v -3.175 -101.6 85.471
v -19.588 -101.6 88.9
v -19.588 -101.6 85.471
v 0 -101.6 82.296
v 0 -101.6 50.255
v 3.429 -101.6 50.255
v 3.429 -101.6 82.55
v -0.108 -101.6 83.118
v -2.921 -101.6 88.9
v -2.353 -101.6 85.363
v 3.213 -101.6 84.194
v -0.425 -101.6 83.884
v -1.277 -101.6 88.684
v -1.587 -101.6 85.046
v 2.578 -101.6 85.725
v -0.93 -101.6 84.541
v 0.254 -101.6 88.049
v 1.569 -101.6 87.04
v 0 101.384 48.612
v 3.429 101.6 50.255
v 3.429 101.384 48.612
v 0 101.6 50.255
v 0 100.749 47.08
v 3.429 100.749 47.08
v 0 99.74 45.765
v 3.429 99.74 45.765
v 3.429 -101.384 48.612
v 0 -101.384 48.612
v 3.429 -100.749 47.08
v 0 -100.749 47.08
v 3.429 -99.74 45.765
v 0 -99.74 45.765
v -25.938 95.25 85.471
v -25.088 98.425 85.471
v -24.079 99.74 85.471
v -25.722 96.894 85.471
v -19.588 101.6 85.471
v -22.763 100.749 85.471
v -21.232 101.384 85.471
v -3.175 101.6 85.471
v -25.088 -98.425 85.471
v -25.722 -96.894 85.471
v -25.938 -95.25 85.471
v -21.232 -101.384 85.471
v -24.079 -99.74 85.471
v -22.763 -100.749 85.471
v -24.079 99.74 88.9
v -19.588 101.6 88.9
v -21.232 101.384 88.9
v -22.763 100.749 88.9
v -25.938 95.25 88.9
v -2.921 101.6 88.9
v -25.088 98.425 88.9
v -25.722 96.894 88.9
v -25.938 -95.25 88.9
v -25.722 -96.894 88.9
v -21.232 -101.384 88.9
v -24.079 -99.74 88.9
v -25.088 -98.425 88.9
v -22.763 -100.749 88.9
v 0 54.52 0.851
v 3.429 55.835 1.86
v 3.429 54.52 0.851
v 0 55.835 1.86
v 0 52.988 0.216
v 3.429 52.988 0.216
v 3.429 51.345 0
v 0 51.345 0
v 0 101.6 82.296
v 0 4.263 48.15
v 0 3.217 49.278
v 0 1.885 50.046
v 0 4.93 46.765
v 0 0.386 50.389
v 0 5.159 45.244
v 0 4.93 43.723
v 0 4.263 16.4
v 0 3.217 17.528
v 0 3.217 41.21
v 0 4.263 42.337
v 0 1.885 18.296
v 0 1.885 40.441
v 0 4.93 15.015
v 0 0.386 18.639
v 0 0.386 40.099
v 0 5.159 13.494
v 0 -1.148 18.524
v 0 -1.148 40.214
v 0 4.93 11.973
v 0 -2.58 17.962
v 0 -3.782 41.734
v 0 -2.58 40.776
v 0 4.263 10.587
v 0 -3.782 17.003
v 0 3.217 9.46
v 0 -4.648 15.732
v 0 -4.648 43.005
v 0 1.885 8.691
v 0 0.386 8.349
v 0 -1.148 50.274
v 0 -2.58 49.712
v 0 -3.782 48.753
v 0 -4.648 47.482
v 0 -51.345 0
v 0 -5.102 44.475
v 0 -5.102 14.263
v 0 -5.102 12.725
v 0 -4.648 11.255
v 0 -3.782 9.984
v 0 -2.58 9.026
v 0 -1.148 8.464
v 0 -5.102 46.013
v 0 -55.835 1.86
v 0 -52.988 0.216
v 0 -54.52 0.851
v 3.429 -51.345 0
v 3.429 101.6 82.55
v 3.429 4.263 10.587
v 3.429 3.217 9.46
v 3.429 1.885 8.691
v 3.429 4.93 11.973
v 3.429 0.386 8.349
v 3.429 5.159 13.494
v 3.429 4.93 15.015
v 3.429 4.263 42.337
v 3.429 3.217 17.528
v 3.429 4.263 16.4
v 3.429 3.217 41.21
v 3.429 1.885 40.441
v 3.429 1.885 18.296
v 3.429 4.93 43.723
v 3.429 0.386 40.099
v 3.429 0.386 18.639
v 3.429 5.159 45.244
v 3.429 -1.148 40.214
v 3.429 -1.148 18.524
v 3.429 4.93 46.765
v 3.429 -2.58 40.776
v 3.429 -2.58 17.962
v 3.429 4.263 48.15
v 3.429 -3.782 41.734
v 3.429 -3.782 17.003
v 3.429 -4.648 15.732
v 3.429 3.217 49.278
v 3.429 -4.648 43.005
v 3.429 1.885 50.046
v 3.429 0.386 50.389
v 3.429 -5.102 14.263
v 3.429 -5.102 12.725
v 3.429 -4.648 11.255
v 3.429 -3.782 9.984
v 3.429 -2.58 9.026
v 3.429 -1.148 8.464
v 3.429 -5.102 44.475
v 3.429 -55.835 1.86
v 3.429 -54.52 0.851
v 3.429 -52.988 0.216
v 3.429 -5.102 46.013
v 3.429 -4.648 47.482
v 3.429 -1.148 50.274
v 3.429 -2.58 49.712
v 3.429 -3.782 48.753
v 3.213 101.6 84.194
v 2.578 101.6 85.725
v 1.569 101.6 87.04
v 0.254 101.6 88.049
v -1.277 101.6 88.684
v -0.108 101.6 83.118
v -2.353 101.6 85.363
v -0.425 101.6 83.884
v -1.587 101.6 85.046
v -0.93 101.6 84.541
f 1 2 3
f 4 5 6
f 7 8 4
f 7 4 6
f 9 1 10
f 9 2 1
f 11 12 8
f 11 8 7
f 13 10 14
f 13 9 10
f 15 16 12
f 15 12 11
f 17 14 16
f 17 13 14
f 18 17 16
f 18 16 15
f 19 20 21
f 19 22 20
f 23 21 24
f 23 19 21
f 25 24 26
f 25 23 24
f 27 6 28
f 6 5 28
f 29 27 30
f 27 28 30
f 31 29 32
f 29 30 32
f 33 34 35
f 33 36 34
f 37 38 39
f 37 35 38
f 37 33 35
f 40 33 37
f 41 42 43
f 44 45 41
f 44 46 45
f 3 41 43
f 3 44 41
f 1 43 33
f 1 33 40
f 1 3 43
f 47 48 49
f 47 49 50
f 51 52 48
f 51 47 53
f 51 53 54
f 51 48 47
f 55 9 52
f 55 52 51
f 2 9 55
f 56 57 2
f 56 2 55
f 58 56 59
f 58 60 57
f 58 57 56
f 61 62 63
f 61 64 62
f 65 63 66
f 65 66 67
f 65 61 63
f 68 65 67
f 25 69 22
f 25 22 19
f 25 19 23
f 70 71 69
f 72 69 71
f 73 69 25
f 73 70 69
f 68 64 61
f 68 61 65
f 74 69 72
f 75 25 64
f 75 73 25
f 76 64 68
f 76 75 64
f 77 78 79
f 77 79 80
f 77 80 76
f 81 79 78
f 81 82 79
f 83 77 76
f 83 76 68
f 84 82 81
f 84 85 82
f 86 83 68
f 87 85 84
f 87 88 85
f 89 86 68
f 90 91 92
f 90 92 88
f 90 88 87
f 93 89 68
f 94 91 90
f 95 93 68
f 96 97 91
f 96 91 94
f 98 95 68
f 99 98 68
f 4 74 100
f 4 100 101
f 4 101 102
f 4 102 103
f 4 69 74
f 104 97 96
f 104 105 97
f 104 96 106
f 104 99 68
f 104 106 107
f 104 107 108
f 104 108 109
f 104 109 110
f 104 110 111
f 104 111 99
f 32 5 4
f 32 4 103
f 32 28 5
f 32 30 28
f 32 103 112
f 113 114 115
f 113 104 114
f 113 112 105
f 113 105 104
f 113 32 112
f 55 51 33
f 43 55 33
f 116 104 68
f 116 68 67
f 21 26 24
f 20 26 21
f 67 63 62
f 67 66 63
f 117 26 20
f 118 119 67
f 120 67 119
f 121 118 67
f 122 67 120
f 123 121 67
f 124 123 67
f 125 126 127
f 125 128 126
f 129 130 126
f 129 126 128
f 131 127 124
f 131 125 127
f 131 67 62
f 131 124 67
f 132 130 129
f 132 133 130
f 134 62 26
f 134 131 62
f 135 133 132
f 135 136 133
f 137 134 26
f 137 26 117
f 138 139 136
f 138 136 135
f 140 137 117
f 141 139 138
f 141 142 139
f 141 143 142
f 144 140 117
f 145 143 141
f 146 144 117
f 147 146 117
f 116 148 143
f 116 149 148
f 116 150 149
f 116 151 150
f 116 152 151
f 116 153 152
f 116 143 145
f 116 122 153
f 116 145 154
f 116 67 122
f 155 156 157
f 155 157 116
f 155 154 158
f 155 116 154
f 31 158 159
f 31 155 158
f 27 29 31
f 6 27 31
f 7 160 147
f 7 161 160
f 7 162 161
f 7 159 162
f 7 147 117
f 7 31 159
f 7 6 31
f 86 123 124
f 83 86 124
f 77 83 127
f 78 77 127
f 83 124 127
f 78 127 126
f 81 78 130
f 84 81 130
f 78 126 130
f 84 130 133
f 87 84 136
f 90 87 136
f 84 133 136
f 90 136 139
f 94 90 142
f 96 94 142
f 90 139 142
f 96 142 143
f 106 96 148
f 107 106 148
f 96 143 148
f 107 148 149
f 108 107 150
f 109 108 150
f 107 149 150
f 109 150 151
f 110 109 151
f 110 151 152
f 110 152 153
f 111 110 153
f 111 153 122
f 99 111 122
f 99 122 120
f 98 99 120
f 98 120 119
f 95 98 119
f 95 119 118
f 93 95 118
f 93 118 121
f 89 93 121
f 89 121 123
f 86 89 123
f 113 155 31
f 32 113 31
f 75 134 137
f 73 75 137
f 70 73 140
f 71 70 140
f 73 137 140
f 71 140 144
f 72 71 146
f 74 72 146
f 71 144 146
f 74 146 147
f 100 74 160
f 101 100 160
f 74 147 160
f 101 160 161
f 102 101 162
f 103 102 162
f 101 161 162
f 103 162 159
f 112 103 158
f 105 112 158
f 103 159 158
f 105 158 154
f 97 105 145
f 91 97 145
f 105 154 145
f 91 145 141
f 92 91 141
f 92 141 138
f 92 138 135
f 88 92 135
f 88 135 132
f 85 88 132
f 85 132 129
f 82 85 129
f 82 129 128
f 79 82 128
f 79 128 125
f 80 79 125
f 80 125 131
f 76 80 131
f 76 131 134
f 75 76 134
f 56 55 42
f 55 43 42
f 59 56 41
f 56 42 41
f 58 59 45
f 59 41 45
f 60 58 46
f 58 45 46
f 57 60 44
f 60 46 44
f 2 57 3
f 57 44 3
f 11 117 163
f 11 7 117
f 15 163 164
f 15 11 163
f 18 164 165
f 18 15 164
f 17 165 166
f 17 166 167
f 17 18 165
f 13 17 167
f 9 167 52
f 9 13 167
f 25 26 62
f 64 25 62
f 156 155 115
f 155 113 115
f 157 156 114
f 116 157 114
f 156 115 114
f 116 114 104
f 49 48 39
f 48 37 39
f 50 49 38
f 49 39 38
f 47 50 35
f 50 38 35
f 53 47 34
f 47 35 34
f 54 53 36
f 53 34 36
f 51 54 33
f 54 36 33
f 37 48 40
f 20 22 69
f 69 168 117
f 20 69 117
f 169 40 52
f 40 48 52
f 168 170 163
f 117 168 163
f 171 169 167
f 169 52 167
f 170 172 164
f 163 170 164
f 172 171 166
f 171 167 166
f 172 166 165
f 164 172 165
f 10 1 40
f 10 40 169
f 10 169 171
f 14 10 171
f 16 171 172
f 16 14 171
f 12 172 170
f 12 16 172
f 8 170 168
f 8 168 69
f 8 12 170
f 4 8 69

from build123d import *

# Parameters (mm, degrees)
F1_DEPTH      = 101.6
F3_DEPTH      = 25.4
F3_DEPTH_BACK = 25.4
F4_R          = 6.35
F5_R          = 5.159375
F6_DEPTH      = 25.4
F6_DEPTH_BACK = 25.4


with BuildPart() as f1:
    # F0 (on Front) → F1 (new body, symmetric)
    with BuildSketch(Plane.XZ):
        with BuildLine():
            Line((-2.921, 88.9), (-25.93848, 88.9))
            Line((-25.93848, 88.9), (-25.93848, 85.471))
            Line((-25.93848, 85.471), (-3.175, 85.471))
            ThreePointArc((-3.175, 85.471), (-0.9299359697, 84.5410640303), (0, 82.296))
            Line((0, 82.296), (0, 0))
            Line((0, 0), (3.429, 0))
            Line((3.429, 0), (3.429, 82.55))
            ThreePointArc((3.429, 82.55), (1.5691280605, 87.0401280605), (-2.921, 88.9))
        make_face()
    extrude(amount=F1_DEPTH, both=True)

    # F2 (on face) → F3 (cut, two sides)
    with BuildSketch(Plane.YZ.offset(3.429)) as f3_sk:
        Polygon((-53.975, 0), (-101.6, 47.625), (-101.6, 0), align=None)
        Polygon((101.6, 0), (101.6, 47.625), (53.975, 0), align=None)
    extrude(amount=-F3_DEPTH, mode=Mode.SUBTRACT)
    extrude(f3_sk.sketch, amount=F3_DEPTH_BACK, mode=Mode.SUBTRACT)

    # F4
    f4_edges = [f1.edges().sort_by_distance(p)[0] for p in [
        (1.7145, -101.6, 47.625),
        (-25.93848, -101.6, 87.1855),
        (1.7145, -53.975, 0),
        (1.7145, 53.975, 0),
        (1.7145, 101.6, 47.625),
        (-25.93848, 101.6, 87.1855),
    ]]
    fillet(f4_edges, radius=F4_R)

    # F5 (on face) → F6 (cut, two sides)
    with BuildSketch(Plane.YZ.offset(3.429)) as f6_sk:
        with Locations((0, 45.24375)):
            Circle(F5_R)
        with Locations((0, 13.49375)):
            Circle(F5_R)
    extrude(amount=-F6_DEPTH, mode=Mode.SUBTRACT)
    extrude(f6_sk.sketch, amount=F6_DEPTH_BACK, mode=Mode.SUBTRACT)


solid = f1.part
